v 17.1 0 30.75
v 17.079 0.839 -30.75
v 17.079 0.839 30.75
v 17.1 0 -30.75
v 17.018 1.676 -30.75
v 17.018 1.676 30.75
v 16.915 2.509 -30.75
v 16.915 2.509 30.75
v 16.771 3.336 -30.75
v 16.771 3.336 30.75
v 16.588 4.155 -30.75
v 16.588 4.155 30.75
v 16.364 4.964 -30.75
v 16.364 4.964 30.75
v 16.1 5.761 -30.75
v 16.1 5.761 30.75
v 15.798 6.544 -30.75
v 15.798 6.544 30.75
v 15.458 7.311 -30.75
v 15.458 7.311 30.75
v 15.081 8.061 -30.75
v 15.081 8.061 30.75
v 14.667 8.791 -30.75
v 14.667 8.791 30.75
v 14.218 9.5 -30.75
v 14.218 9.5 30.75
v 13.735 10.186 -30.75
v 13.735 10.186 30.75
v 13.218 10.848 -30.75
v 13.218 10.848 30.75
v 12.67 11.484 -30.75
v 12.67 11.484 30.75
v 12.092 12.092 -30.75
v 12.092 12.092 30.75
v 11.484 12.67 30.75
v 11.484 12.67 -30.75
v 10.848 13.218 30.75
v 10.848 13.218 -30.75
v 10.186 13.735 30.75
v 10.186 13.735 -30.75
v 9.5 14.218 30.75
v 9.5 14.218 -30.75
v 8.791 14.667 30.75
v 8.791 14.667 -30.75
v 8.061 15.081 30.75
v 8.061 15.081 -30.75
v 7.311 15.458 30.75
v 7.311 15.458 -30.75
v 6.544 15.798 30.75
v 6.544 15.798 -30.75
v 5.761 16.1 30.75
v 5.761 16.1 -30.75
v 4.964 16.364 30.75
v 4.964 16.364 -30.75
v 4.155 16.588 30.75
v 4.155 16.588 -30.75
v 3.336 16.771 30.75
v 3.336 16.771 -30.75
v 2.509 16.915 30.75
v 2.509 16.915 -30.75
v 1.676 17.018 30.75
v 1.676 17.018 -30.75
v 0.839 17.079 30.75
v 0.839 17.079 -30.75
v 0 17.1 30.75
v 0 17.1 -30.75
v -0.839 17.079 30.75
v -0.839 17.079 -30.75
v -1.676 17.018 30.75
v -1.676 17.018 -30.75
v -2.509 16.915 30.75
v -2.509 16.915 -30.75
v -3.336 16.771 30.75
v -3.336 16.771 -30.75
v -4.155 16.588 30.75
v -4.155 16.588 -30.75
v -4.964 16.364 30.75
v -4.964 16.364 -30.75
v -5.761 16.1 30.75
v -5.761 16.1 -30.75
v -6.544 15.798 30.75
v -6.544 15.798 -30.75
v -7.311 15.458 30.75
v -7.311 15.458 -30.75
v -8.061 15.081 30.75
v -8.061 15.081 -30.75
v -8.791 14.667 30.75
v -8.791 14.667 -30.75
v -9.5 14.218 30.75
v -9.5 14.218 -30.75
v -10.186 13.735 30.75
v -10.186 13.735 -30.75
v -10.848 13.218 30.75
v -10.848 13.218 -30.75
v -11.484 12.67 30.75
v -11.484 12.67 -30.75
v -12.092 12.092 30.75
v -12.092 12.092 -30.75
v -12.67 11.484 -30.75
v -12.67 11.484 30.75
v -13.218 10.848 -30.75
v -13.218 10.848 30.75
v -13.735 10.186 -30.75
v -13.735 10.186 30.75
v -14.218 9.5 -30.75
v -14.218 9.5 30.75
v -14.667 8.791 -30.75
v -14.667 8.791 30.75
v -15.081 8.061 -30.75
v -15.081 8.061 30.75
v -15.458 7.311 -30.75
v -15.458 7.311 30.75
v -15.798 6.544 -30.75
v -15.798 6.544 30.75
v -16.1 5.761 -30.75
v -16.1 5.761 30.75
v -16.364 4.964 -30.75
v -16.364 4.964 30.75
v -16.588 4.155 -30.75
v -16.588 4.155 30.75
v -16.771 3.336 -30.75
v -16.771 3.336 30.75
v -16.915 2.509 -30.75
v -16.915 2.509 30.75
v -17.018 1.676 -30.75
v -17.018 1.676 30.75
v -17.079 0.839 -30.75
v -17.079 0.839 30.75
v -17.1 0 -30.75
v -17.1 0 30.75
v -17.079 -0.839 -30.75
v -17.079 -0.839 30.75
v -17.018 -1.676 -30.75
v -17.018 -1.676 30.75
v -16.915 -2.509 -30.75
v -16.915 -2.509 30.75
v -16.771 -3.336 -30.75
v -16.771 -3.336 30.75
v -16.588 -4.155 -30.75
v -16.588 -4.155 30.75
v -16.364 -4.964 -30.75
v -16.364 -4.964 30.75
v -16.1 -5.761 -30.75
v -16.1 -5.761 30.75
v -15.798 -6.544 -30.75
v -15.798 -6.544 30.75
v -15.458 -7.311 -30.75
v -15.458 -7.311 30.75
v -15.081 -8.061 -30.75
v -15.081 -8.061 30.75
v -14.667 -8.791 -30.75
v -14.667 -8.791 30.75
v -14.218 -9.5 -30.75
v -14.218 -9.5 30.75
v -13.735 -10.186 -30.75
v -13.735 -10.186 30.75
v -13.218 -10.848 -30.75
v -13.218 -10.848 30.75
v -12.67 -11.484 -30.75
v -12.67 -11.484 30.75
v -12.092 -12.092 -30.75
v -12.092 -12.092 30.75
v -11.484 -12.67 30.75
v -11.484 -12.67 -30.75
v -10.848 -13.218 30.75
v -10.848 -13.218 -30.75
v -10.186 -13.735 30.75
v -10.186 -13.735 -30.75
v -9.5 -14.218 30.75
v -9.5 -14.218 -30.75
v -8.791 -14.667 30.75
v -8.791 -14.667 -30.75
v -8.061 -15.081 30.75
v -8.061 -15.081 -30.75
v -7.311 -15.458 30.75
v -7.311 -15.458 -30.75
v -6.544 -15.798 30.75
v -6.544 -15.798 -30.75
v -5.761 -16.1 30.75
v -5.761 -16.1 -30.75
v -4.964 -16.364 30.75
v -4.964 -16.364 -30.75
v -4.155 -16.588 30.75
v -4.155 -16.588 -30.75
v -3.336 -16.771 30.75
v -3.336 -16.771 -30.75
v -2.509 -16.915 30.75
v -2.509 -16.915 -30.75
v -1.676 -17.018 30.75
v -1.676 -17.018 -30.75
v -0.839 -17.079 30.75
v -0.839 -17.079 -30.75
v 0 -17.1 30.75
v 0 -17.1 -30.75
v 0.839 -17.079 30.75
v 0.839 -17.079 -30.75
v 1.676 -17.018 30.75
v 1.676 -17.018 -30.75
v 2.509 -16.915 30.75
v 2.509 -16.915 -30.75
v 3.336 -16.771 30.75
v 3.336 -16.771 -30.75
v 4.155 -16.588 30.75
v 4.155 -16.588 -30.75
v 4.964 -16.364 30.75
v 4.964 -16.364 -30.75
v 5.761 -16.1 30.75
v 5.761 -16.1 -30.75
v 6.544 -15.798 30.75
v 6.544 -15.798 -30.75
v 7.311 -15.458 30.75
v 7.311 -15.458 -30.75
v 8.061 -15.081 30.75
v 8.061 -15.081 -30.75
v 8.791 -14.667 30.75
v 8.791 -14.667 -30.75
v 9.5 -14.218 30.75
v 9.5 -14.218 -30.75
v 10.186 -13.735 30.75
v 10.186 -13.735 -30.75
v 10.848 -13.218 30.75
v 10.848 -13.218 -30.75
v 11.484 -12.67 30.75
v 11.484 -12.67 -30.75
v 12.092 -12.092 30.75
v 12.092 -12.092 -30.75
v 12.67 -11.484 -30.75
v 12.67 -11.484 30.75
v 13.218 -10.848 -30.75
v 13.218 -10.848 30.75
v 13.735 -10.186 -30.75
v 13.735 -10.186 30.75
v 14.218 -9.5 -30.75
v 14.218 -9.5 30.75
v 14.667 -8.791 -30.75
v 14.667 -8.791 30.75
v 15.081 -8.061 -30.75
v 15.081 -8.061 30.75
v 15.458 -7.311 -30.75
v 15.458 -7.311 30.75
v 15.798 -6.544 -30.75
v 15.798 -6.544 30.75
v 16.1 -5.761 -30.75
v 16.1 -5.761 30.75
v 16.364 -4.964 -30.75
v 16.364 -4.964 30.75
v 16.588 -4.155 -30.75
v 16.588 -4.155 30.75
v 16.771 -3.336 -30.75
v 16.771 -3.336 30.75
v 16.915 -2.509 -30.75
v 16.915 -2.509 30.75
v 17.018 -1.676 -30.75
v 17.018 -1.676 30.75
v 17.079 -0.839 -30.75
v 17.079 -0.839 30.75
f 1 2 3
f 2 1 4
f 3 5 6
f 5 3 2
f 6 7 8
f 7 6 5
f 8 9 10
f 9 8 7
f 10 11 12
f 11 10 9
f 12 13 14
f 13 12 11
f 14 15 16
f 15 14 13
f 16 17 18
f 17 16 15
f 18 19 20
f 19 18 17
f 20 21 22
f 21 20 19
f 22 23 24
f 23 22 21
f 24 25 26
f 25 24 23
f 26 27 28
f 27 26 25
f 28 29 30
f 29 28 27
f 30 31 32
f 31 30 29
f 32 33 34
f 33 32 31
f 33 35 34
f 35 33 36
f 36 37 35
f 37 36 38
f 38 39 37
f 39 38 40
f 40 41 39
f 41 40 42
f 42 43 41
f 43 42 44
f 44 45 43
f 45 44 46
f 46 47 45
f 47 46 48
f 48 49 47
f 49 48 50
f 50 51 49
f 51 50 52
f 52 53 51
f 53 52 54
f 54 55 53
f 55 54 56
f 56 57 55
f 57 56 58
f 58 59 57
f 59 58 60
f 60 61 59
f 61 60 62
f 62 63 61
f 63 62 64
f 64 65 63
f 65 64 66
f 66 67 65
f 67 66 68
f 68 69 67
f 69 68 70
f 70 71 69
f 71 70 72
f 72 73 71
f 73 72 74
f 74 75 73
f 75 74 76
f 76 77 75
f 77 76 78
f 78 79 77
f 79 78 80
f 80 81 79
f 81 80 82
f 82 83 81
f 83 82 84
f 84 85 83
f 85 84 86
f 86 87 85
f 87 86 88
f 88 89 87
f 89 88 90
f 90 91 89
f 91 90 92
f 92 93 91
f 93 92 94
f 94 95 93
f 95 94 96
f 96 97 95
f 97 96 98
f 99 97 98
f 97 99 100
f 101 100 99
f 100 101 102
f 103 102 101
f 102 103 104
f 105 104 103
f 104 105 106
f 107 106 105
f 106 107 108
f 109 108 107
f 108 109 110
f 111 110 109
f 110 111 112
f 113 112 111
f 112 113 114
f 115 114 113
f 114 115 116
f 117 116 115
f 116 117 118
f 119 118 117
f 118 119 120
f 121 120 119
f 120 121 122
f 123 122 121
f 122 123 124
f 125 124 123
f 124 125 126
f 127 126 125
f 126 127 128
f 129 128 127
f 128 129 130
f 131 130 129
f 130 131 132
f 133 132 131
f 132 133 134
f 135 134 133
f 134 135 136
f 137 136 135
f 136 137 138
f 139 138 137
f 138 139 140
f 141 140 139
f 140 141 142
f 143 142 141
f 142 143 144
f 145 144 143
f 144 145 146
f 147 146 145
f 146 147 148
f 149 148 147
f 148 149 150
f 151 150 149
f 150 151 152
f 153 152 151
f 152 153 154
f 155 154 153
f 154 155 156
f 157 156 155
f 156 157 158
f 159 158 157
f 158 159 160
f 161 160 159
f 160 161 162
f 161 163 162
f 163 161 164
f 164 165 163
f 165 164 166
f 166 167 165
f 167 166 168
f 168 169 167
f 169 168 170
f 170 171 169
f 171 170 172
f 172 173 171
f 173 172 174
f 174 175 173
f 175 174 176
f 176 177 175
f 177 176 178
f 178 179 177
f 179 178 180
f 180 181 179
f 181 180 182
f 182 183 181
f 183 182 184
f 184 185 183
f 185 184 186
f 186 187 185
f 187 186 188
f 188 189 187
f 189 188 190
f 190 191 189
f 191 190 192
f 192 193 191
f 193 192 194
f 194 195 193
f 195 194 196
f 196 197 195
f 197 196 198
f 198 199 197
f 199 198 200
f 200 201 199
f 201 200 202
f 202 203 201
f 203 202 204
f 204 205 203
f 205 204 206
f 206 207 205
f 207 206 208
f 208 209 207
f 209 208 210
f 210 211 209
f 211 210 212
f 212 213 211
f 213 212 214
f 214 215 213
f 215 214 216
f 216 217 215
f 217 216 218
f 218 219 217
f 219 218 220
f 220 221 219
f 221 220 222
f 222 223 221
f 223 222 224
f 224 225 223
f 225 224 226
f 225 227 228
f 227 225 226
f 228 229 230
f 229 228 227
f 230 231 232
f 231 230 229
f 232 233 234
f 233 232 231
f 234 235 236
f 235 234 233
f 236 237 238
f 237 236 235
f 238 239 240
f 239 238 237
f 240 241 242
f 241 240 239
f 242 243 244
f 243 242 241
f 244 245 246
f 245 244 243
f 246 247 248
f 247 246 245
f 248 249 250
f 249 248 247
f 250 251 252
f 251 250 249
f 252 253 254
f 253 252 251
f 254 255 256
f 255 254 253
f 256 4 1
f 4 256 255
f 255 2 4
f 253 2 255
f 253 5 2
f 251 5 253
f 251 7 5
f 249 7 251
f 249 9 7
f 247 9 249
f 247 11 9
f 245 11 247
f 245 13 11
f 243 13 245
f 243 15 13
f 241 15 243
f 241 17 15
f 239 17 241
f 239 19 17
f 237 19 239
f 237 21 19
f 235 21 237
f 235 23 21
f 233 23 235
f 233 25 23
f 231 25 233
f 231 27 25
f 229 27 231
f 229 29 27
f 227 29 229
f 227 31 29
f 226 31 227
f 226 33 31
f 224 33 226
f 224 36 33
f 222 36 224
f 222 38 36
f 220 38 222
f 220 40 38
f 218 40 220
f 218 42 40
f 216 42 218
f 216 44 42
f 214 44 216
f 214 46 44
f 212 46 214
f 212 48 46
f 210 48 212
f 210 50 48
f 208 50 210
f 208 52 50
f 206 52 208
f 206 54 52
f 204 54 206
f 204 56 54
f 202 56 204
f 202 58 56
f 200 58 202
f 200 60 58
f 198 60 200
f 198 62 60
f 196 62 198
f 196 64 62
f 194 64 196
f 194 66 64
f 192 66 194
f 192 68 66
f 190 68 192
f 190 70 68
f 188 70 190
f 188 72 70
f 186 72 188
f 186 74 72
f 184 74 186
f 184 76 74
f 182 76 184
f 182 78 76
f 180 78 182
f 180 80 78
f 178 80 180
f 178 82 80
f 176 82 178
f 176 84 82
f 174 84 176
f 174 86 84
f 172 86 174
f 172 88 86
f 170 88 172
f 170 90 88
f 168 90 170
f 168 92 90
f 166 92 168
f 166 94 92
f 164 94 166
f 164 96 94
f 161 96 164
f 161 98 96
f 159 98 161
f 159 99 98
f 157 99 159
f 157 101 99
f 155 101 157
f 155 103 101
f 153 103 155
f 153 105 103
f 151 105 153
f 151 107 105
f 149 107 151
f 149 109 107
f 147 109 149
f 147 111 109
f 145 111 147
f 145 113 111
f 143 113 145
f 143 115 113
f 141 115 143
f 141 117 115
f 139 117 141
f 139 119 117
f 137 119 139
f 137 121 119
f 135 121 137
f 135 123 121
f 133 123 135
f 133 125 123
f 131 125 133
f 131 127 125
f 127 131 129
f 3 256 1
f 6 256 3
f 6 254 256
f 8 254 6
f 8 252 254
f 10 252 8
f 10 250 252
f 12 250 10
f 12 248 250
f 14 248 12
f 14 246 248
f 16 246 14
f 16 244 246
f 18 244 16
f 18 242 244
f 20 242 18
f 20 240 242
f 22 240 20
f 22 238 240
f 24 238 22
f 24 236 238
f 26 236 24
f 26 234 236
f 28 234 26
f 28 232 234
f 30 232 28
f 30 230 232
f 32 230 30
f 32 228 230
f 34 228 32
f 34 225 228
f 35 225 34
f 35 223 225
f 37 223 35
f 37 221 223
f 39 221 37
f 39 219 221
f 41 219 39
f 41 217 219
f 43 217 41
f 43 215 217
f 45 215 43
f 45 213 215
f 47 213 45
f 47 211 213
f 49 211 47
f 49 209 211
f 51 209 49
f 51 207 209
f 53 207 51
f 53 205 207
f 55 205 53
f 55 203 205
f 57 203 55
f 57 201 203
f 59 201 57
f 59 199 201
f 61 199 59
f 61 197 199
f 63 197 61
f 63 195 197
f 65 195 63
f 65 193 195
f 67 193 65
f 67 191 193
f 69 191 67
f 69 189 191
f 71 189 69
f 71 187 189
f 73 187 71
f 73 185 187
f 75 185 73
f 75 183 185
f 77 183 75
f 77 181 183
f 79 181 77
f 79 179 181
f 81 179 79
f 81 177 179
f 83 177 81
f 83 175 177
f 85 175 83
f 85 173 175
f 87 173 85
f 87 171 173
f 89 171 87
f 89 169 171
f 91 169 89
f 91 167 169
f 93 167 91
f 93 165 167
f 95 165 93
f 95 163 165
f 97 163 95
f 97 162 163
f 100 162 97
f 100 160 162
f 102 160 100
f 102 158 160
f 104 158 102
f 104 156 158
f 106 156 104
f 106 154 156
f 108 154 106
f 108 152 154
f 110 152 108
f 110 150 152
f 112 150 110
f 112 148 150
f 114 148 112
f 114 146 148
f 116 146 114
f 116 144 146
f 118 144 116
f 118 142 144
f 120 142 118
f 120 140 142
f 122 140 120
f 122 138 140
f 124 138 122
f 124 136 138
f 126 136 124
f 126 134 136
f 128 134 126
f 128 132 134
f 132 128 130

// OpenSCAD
$fn=128;

cell_height = 61.5;
cell_diameter = 34.2;

module battery_cell(h=cell_height, d=cell_diameter) {
    cylinder(h=h, d=d, center=true);
}

battery_cell();
